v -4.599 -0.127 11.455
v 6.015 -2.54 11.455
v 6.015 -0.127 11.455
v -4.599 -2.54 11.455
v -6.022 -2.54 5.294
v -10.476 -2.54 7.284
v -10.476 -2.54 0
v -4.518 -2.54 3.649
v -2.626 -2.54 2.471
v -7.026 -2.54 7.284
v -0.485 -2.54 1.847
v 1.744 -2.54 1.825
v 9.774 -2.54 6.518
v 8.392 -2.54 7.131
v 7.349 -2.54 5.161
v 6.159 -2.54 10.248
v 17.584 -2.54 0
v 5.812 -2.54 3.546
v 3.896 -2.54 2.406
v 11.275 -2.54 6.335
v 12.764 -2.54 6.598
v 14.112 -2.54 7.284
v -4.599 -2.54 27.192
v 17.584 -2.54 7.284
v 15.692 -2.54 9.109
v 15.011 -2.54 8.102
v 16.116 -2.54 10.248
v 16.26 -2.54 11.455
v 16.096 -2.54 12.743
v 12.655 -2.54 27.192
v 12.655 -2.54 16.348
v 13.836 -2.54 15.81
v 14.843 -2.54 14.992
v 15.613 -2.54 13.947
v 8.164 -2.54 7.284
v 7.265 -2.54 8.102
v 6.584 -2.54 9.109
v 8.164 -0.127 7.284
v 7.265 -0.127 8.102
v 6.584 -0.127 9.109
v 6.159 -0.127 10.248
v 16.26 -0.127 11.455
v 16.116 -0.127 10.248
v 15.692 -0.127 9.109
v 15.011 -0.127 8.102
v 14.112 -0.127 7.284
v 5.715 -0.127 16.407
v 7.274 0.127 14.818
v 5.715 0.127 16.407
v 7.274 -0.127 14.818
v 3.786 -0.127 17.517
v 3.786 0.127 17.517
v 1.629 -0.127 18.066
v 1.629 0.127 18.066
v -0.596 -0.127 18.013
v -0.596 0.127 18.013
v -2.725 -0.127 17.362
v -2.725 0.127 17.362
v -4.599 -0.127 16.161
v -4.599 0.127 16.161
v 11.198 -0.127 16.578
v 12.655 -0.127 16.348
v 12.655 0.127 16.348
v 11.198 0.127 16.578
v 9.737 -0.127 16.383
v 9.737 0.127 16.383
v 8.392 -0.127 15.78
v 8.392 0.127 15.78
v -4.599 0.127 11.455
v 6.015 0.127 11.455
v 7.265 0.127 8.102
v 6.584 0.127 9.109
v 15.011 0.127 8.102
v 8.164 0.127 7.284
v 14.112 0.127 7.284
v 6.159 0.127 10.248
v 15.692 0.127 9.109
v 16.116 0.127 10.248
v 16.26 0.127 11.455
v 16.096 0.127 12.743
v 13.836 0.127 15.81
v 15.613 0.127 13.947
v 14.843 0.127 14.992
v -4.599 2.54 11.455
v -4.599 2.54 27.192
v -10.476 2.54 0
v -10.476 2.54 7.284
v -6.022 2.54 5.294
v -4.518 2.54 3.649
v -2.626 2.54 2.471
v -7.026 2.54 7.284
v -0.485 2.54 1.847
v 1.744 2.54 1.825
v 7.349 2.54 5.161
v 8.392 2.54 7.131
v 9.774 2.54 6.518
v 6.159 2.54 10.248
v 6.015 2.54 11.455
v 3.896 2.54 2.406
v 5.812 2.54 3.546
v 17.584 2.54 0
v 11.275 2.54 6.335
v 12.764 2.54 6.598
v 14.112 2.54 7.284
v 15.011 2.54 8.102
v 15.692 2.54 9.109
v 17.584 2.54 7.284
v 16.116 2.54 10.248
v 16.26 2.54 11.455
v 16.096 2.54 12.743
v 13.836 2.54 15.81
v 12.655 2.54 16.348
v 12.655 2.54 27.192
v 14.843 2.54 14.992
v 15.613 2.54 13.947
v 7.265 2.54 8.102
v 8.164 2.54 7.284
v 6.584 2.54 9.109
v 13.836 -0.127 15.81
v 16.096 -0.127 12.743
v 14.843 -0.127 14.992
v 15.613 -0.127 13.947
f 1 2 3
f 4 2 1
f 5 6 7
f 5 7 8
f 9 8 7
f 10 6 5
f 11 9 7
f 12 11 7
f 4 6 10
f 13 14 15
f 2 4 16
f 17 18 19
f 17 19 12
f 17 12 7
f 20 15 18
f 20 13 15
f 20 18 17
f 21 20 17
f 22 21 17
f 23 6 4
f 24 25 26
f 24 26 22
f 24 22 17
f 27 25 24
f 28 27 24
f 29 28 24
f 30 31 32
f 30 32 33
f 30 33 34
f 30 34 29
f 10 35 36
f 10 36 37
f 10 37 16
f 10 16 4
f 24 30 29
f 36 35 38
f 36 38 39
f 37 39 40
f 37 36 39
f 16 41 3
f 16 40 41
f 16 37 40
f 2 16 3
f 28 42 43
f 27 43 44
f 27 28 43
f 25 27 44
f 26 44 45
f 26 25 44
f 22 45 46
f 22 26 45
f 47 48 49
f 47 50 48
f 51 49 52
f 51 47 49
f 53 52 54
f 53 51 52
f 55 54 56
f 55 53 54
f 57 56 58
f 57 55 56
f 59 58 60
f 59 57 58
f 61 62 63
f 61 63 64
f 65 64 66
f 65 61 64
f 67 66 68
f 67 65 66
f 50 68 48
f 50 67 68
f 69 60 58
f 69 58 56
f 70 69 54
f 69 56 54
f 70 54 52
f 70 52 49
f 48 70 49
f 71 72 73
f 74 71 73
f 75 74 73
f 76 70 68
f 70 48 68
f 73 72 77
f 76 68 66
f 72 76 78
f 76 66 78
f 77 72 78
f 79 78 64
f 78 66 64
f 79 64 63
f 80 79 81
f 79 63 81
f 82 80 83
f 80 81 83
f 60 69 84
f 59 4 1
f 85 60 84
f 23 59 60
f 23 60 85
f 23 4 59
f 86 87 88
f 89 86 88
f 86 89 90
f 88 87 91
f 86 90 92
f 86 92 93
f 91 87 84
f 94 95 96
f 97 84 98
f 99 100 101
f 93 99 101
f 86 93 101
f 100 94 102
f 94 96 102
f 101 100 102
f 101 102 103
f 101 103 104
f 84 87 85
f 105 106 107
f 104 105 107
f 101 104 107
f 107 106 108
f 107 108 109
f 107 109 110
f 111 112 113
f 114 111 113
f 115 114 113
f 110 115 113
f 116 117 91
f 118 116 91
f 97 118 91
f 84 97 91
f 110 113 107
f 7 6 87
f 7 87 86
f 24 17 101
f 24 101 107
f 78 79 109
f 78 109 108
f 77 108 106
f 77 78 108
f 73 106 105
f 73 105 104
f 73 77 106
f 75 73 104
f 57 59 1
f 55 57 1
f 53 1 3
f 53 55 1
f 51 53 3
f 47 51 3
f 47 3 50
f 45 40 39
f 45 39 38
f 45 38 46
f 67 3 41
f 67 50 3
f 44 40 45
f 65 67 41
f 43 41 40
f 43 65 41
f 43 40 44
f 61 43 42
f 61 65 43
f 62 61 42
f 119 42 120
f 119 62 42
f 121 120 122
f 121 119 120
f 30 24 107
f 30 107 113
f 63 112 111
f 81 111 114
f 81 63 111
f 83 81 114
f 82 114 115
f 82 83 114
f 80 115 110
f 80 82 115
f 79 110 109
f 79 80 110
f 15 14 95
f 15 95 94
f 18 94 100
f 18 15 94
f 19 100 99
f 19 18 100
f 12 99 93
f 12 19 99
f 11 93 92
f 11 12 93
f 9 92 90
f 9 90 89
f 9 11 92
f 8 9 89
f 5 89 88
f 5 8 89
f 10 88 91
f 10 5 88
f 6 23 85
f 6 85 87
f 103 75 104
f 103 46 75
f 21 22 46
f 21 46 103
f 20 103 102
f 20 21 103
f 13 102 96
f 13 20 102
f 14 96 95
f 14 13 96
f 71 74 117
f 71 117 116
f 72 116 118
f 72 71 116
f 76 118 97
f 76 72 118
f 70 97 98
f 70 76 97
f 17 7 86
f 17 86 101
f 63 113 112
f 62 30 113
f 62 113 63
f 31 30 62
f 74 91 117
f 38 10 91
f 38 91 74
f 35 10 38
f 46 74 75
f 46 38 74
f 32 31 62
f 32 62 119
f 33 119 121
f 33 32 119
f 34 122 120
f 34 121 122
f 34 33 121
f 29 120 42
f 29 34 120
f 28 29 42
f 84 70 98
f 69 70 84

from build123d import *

# Parameters (mm, degrees)
F1_DEPTH = 2.54
F2_DEPTH = 0.127


# Not quite as in the source:
# - a feature names something its author has since deleted; it is built from what else it names


with BuildPart() as f1:
    # F0 (on Front) → F1 (new body, symmetric)
    with BuildSketch(Plane.XZ):
        with BuildLine():
            Line((14.1115041016, 7.2841788642), (17.5840938227, 7.2841788642))
            Line((17.5840938227, 7.2841788642), (12.6545671137, 27.1918801591))
            Line((12.6545671137, 27.1918801591), (12.6545671137, 16.3482450677))
            ThreePointArc((12.6545671137, 16.3482450677), (15.261577361, 14.4943512953), (16.2604214978, 11.4553160965))
            ThreePointArc((16.2604214978, 11.4553160965), (15.6916123075, 9.109243219), (14.1115041016, 7.2841788642))
        make_face()
        with BuildLine():
            Line((-4.5987749709, 27.1918801591), (-10.4762865467, 7.2841788642))
            Line((-10.4762865467, 7.2841788642), (-7.0264551949, 7.2841788642))
            ThreePointArc((-7.0264551949, 7.2841788642), (-7.1794052372, 12.0962388338), (-4.5987749709, 16.1606775766))
            Line((-4.5987749709, 16.1606775766), (-4.5987749709, 27.1918801591))
        make_face()
        with BuildLine():
            ThreePointArc((-4.5987749709, 16.1606775766), (-7.1794052372, 12.0962388338), (-7.0264551949, 7.2841788642))
            Line((-7.0264551949, 7.2841788642), (8.1640722191, 7.2841788642))
            ThreePointArc((8.1640722191, 7.2841788642), (6.5839640132, 9.109243219), (6.0151548229, 11.4553160965))
            Line((6.0151548229, 11.4553160965), (0.7099450795, 11.4553160965))
            Line((0.7099450795, 11.4553160965), (-4.5987749709, 11.4553160965))
            Line((-4.5987749709, 11.4553160965), (-4.5987749709, 16.1606775766))
        make_face()
        with BuildLine():
            Line((-10.4762865467, 7.2841788642), (-10.4762865467, 0))
            Line((-10.4762865467, 0), (17.5840938227, 0))
            Line((17.5840938227, 0), (17.5840938227, 7.2841788642))
            Line((17.5840938227, 7.2841788642), (14.1115041016, 7.2841788642))
            ThreePointArc((14.1115041016, 7.2841788642), (11.2751644394, 6.3345251354), (8.3919880677, 7.1307404918))
            ThreePointArc((8.3919880677, 7.1307404918), (0.6285539733, 1.7598537536), (-7.0264551949, 7.2841788642))
            Line((-7.0264551949, 7.2841788642), (-10.4762865467, 7.2841788642))
        make_face()
        with BuildLine():
            Line((-10.4762865467, 7.2841788642), (-10.4762865467, 0))
            Line((-10.4762865467, 0), (17.5840938227, 0))
            Line((17.5840938227, 0), (17.5840938227, 7.2841788642))
            Line((17.5840938227, 7.2841788642), (14.1115041016, 7.2841788642))
            ThreePointArc((14.1115041016, 7.2841788642), (11.2751644394, 6.3345251354), (8.3919880677, 7.1307404918))
            ThreePointArc((8.3919880677, 7.1307404918), (0.6285539733, 1.7598537536), (-7.0264551949, 7.2841788642))
            Line((-7.0264551949, 7.2841788642), (-10.4762865467, 7.2841788642))
        make_face()
    extrude(amount=F1_DEPTH, both=True)

    # F0 (on Front) → F2 (join, symmetric)
    with BuildSketch(Plane.XZ):
        with BuildLine():
            ThreePointArc((7.2737737734, 14.8184641943), (1.628753339, 18.0658576504), (-4.5987749709, 16.1606775766))
            Line((-4.5987749709, 16.1606775766), (-4.5987749709, 11.4553160965))
            Line((-4.5987749709, 11.4553160965), (0.7099450795, 11.4553160965))
            Line((0.7099450795, 11.4553160965), (6.0151548229, 11.4553160965))
            ThreePointArc((6.0151548229, 11.4553160965), (6.3401167864, 13.250788652), (7.2737737734, 14.8184641943))
        make_face()
        with BuildLine():
            ThreePointArc((7.2737737734, 14.8184641943), (6.3401167864, 13.250788652), (6.0151548229, 11.4553160965))
            Line((6.0151548229, 11.4553160965), (8.7471650108, 11.4553160965))
            ThreePointArc((8.7471650108, 11.4553160965), (8.2016302385, 13.220637488), (7.2737737734, 14.8184641943))
        make_face()
        with BuildLine():
            ThreePointArc((6.0151548229, 11.4553160965), (6.5839640132, 9.109243219), (8.1640722191, 7.2841788642))
            Line((8.1640722191, 7.2841788642), (8.4463453539, 7.2841788642))
            ThreePointArc((8.4463453539, 7.2841788642), (8.7776037503, 8.5930277501), (8.8890353081, 9.9385390058))
            ThreePointArc((8.8890353081, 9.9385390058), (8.8534904982, 10.7002377527), (8.7471650108, 11.4553160965))
            Line((8.7471650108, 11.4553160965), (6.0151548229, 11.4553160965))
        make_face()
        with BuildLine():
            Line((8.4463453539, 7.2841788642), (14.1115041016, 7.2841788642))
            ThreePointArc((14.1115041016, 7.2841788642), (15.6916123075, 9.109243219), (16.2604214978, 11.4553160965))
            ThreePointArc((16.2604214978, 11.4553160965), (15.261577361, 14.4943512953), (12.6545671137, 16.3482450677))
            ThreePointArc((12.6545671137, 16.3482450677), (9.7369184571, 16.3826821662), (7.2737737734, 14.8184641943))
            ThreePointArc((7.2737737734, 14.8184641943), (8.2016302385, 13.220637488), (8.7471650108, 11.4553160965))
            ThreePointArc((8.7471650108, 11.4553160965), (8.8534904982, 10.7002377527), (8.8890353081, 9.9385390058))
            ThreePointArc((8.8890353081, 9.9385390058), (8.7776037503, 8.5930277501), (8.4463453539, 7.2841788642))
        make_face()
    extrude(amount=F2_DEPTH, both=True)


solid = f1.part
